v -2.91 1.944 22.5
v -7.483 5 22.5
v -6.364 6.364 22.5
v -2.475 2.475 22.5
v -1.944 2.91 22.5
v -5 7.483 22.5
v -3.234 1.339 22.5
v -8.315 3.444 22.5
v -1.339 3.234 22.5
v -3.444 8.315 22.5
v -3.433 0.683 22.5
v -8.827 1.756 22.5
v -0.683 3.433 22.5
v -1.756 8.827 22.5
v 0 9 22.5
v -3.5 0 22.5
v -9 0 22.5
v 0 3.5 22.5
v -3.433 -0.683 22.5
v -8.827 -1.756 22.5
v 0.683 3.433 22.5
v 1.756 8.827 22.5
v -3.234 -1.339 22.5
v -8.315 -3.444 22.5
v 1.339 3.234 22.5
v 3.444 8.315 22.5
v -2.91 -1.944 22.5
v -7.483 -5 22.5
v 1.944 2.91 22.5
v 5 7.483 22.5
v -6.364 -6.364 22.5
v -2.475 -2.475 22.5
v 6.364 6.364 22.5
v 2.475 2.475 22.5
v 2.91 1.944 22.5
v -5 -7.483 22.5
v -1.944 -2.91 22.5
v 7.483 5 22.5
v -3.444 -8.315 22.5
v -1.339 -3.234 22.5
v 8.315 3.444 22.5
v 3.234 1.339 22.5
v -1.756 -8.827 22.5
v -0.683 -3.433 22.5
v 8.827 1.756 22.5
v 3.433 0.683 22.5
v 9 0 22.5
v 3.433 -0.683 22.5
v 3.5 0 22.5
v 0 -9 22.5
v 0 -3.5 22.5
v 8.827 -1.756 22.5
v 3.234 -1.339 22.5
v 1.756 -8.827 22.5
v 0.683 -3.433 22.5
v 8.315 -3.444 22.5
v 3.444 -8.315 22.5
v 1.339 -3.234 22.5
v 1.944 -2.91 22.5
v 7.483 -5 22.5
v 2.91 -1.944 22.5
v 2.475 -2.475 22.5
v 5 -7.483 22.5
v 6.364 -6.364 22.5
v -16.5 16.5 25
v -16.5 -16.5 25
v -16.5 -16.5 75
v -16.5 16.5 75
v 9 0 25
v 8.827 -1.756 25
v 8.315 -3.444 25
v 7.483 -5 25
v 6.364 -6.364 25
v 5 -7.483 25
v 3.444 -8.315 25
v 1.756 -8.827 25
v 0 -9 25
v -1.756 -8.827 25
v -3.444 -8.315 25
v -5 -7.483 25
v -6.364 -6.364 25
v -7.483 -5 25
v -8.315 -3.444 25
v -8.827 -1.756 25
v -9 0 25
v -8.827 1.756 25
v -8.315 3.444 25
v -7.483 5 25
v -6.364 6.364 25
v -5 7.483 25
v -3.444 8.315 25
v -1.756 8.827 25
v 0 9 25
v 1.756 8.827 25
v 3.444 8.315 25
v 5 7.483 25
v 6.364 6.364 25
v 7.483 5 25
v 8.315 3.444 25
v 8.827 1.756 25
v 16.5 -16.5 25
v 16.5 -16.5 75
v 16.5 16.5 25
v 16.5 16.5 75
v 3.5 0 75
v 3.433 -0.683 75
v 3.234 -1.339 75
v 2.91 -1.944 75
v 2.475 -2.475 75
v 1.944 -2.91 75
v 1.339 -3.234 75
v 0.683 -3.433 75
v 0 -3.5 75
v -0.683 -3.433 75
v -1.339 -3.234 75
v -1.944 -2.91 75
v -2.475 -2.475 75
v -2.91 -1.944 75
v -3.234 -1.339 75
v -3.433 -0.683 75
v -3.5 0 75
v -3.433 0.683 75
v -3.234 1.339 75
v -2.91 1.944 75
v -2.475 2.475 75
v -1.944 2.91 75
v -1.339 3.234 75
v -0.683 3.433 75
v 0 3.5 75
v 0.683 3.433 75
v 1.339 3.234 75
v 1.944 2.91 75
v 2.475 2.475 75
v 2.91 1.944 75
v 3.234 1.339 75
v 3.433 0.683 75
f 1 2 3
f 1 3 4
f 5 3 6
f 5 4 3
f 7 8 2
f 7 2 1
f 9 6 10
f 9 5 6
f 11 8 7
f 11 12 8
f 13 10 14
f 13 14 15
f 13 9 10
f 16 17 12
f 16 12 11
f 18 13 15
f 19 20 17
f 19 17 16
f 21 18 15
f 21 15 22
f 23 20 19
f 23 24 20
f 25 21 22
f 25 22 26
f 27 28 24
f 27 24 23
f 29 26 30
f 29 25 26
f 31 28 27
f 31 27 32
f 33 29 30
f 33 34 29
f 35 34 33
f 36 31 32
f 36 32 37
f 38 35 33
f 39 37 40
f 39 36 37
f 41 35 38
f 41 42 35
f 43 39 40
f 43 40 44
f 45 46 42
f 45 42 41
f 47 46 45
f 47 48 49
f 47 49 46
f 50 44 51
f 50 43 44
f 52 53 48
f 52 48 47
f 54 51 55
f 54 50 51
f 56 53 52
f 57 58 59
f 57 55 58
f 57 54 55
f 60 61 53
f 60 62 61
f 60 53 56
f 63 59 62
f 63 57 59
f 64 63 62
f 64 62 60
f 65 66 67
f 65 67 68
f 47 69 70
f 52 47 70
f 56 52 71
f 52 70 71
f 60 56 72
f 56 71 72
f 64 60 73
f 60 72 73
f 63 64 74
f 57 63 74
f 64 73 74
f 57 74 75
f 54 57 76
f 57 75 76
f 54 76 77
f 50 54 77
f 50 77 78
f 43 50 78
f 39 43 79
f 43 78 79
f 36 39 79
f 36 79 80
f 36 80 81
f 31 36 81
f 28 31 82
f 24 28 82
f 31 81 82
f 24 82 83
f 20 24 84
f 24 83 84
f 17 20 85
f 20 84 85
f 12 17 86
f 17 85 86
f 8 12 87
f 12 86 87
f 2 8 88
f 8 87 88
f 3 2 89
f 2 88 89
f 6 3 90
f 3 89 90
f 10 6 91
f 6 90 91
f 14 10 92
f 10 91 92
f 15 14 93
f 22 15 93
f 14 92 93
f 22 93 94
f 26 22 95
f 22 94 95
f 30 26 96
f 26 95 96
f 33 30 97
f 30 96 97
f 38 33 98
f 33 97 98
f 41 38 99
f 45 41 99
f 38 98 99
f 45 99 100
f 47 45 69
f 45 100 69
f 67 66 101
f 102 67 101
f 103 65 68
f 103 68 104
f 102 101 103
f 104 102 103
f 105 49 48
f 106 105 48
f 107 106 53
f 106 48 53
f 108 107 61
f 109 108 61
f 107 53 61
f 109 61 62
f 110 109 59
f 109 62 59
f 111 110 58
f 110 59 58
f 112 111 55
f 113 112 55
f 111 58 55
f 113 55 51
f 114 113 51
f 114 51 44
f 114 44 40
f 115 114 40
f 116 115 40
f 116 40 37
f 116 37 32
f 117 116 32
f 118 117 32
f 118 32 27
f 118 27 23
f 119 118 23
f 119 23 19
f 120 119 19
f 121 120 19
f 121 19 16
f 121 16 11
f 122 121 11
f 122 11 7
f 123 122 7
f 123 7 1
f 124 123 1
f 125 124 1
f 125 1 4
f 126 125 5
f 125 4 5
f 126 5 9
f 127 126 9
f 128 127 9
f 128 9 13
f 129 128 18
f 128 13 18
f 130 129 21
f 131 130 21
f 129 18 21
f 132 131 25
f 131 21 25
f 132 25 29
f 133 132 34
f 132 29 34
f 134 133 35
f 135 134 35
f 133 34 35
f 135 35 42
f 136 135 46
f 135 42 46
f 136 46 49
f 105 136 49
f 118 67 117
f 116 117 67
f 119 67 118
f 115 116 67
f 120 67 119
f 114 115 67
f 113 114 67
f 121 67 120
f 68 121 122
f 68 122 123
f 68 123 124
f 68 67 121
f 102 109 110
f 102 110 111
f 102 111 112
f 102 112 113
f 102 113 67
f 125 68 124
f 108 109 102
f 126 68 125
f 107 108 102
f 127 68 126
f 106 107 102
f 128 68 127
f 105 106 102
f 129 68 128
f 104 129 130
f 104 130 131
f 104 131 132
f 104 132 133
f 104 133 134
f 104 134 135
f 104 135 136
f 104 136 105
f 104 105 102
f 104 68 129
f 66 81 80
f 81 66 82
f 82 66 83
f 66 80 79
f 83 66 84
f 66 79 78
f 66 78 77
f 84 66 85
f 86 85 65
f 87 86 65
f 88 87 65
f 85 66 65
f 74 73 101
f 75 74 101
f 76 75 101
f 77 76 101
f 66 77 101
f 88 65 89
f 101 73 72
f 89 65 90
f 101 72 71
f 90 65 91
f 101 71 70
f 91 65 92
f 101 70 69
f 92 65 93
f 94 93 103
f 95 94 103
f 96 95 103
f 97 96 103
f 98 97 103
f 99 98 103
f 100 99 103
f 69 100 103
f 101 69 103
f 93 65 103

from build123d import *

# Parameters (mm, degrees)
BOX_W           = 33
BOX_H           = 33
BOX_DEPTH       = 50
SKETCH002_R     = 9
PAD001_DEPTH    = 2.5
SKETCH003_R     = 3.5
POCKET001_DEPTH = 53


with BuildPart() as part:
    # Box → Box (new body)
    with BuildSketch(Plane(origin=(-16.5, -16.5, 25), x_dir=(1, 0, 0), z_dir=(0, 0, 1))):
        with Locations((16.5, 16.5)):
            Rectangle(BOX_W, BOX_H)
    extrude(amount=BOX_DEPTH)

    # Sketch002 → Pad001 (new body)
    with BuildSketch(Plane(origin=(-16.5, -16.5, 25), x_dir=(1, 0, 0), z_dir=(0, 0, -1))):
        with Locations((16.5, -16.5)):
            Circle(SKETCH002_R)
    extrude(amount=PAD001_DEPTH)

    # Sketch003 → Pocket001 (cut)
    with BuildSketch(Plane(origin=(-16.5, -16.5, 22.5), x_dir=(1, 0, 0), z_dir=(0, 0, -1))):
        with Locations((16.5, -16.5)):
            Circle(SKETCH003_R)
    extrude(amount=-POCKET001_DEPTH, mode=Mode.SUBTRACT)


solid = part.part
